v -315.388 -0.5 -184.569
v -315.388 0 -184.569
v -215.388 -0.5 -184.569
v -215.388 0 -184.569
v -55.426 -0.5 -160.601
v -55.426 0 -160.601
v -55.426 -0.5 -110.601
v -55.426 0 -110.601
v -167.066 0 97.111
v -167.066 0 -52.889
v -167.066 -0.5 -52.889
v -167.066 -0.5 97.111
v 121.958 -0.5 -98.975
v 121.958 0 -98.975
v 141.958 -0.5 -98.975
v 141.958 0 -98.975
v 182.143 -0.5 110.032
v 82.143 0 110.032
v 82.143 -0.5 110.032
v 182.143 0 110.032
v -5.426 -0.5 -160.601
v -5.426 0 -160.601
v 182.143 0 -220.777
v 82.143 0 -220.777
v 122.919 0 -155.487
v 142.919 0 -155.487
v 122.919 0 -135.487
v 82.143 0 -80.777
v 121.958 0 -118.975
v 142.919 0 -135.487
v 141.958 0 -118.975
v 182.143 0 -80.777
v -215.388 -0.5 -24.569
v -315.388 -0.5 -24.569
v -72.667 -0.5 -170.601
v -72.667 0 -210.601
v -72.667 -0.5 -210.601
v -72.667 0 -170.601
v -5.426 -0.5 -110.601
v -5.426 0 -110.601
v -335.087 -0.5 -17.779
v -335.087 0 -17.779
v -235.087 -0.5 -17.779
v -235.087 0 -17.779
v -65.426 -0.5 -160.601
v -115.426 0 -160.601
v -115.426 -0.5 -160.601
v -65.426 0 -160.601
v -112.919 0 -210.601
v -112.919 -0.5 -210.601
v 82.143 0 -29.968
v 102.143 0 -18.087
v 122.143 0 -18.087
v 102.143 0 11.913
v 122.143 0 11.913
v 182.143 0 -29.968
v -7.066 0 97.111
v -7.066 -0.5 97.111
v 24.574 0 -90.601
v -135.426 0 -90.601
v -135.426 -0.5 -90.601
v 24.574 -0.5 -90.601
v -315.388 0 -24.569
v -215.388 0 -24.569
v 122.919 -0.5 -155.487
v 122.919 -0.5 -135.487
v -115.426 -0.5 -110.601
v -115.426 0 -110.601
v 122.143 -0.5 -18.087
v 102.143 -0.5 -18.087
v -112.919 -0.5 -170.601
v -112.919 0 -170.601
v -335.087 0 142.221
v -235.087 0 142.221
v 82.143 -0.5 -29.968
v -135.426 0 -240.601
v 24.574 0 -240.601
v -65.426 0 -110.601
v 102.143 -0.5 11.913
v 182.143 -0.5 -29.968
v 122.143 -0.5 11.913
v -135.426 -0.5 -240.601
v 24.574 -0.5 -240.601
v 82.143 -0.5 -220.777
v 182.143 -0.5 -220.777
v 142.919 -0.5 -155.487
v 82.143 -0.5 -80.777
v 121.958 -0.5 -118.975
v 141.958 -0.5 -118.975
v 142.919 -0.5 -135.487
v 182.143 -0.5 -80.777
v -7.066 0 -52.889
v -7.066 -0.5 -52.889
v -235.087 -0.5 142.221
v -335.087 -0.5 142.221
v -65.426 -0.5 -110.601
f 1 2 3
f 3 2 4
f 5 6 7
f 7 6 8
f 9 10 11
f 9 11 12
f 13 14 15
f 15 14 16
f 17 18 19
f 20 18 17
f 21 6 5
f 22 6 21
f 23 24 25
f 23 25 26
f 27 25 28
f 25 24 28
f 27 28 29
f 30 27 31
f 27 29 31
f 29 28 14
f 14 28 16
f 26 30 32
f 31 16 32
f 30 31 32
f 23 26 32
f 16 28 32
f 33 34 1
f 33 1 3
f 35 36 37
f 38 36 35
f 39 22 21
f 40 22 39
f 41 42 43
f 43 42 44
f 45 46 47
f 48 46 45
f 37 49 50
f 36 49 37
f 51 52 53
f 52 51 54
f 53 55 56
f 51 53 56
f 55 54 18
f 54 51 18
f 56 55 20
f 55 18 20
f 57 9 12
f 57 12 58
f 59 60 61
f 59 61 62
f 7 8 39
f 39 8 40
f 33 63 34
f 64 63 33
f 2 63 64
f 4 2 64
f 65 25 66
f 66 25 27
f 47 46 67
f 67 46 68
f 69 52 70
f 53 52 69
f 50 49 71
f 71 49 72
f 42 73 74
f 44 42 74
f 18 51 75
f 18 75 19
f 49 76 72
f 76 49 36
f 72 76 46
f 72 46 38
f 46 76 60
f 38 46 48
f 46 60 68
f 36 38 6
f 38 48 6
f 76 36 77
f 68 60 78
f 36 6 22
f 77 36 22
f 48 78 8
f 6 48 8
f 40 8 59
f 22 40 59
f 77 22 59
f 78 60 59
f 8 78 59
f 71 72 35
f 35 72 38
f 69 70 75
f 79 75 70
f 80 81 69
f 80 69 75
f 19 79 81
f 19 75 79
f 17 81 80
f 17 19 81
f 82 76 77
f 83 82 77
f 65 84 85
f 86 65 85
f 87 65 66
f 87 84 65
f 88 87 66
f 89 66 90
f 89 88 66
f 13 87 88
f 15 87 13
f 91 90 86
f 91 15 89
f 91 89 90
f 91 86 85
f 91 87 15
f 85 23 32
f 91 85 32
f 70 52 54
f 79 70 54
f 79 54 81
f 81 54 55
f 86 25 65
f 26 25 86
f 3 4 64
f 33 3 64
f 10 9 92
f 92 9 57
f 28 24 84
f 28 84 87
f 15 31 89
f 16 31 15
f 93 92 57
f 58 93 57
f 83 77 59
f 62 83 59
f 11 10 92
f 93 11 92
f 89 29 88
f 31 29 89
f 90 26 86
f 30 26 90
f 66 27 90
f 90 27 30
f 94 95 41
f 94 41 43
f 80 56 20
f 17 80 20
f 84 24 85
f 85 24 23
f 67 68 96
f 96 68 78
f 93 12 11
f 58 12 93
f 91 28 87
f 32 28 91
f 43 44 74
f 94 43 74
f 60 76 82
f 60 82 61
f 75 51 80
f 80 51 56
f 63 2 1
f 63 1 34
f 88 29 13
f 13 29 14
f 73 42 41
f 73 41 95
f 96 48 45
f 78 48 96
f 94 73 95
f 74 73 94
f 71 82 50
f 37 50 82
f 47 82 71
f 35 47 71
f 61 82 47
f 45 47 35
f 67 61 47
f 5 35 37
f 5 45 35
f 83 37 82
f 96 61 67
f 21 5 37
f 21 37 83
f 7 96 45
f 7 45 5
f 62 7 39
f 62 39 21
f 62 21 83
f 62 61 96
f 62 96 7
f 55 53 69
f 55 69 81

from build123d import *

# Parameters (mm, degrees)
F0_W     = 160
F0_H     = 150
F0_W_2   = 40.252022
F0_H_2   = 40
F0_W_3   = 50
F0_H_3   = 50
F0_W_4   = 100
F0_H_4   = 140
F0_W_5   = 20
F0_H_5   = 20
F0_H_6   = 30
F0_H_7   = 160
F1_DEPTH = 0.5


with BuildPart() as f1:
    # F0 (on Front) → F1 (new body)
    with BuildSketch(Plane.XZ):
        with Locations((-55.426337, -165.600558)):
            Rectangle(F0_W, F0_H)
        with Locations((-92.792649, -190.600558)):
            Rectangle(F0_W_2, F0_H_2, mode=Mode.SUBTRACT)
        with Locations((-90.426337, -135.600558)):
            Rectangle(F0_W_3, F0_H_3, mode=Mode.SUBTRACT)
        with Locations((-30.426337, -135.600558)):
            Rectangle(F0_W_3, F0_H_3, mode=Mode.SUBTRACT)
        with Locations((132.142994, -150.77734)):
            Rectangle(F0_W_4, F0_H_4)
        with Locations((132.918606, -145.487433)):
            Rectangle(F0_W_5, F0_H_5, mode=Mode.SUBTRACT)
        with Locations((131.957764, -108.975475)):
            Rectangle(F0_W_5, F0_H_5, mode=Mode.SUBTRACT)
        with Locations((132.142994, 40.032422)):
            Rectangle(F0_W_4, F0_H_4)
        with Locations((112.142994, -3.087167)):
            Rectangle(F0_W_5, F0_H_6, mode=Mode.SUBTRACT)
        with Locations((-87.065799, 22.111066)):
            Rectangle(F0_W, F0_H)
        with Locations((-265.387934, -104.568509)):
            Rectangle(F0_W_4, F0_H_7)
        with Locations((-285.087478, 62.220808)):
            Rectangle(F0_W_4, F0_H_7)
    extrude(amount=F1_DEPTH)


solid = f1.part
